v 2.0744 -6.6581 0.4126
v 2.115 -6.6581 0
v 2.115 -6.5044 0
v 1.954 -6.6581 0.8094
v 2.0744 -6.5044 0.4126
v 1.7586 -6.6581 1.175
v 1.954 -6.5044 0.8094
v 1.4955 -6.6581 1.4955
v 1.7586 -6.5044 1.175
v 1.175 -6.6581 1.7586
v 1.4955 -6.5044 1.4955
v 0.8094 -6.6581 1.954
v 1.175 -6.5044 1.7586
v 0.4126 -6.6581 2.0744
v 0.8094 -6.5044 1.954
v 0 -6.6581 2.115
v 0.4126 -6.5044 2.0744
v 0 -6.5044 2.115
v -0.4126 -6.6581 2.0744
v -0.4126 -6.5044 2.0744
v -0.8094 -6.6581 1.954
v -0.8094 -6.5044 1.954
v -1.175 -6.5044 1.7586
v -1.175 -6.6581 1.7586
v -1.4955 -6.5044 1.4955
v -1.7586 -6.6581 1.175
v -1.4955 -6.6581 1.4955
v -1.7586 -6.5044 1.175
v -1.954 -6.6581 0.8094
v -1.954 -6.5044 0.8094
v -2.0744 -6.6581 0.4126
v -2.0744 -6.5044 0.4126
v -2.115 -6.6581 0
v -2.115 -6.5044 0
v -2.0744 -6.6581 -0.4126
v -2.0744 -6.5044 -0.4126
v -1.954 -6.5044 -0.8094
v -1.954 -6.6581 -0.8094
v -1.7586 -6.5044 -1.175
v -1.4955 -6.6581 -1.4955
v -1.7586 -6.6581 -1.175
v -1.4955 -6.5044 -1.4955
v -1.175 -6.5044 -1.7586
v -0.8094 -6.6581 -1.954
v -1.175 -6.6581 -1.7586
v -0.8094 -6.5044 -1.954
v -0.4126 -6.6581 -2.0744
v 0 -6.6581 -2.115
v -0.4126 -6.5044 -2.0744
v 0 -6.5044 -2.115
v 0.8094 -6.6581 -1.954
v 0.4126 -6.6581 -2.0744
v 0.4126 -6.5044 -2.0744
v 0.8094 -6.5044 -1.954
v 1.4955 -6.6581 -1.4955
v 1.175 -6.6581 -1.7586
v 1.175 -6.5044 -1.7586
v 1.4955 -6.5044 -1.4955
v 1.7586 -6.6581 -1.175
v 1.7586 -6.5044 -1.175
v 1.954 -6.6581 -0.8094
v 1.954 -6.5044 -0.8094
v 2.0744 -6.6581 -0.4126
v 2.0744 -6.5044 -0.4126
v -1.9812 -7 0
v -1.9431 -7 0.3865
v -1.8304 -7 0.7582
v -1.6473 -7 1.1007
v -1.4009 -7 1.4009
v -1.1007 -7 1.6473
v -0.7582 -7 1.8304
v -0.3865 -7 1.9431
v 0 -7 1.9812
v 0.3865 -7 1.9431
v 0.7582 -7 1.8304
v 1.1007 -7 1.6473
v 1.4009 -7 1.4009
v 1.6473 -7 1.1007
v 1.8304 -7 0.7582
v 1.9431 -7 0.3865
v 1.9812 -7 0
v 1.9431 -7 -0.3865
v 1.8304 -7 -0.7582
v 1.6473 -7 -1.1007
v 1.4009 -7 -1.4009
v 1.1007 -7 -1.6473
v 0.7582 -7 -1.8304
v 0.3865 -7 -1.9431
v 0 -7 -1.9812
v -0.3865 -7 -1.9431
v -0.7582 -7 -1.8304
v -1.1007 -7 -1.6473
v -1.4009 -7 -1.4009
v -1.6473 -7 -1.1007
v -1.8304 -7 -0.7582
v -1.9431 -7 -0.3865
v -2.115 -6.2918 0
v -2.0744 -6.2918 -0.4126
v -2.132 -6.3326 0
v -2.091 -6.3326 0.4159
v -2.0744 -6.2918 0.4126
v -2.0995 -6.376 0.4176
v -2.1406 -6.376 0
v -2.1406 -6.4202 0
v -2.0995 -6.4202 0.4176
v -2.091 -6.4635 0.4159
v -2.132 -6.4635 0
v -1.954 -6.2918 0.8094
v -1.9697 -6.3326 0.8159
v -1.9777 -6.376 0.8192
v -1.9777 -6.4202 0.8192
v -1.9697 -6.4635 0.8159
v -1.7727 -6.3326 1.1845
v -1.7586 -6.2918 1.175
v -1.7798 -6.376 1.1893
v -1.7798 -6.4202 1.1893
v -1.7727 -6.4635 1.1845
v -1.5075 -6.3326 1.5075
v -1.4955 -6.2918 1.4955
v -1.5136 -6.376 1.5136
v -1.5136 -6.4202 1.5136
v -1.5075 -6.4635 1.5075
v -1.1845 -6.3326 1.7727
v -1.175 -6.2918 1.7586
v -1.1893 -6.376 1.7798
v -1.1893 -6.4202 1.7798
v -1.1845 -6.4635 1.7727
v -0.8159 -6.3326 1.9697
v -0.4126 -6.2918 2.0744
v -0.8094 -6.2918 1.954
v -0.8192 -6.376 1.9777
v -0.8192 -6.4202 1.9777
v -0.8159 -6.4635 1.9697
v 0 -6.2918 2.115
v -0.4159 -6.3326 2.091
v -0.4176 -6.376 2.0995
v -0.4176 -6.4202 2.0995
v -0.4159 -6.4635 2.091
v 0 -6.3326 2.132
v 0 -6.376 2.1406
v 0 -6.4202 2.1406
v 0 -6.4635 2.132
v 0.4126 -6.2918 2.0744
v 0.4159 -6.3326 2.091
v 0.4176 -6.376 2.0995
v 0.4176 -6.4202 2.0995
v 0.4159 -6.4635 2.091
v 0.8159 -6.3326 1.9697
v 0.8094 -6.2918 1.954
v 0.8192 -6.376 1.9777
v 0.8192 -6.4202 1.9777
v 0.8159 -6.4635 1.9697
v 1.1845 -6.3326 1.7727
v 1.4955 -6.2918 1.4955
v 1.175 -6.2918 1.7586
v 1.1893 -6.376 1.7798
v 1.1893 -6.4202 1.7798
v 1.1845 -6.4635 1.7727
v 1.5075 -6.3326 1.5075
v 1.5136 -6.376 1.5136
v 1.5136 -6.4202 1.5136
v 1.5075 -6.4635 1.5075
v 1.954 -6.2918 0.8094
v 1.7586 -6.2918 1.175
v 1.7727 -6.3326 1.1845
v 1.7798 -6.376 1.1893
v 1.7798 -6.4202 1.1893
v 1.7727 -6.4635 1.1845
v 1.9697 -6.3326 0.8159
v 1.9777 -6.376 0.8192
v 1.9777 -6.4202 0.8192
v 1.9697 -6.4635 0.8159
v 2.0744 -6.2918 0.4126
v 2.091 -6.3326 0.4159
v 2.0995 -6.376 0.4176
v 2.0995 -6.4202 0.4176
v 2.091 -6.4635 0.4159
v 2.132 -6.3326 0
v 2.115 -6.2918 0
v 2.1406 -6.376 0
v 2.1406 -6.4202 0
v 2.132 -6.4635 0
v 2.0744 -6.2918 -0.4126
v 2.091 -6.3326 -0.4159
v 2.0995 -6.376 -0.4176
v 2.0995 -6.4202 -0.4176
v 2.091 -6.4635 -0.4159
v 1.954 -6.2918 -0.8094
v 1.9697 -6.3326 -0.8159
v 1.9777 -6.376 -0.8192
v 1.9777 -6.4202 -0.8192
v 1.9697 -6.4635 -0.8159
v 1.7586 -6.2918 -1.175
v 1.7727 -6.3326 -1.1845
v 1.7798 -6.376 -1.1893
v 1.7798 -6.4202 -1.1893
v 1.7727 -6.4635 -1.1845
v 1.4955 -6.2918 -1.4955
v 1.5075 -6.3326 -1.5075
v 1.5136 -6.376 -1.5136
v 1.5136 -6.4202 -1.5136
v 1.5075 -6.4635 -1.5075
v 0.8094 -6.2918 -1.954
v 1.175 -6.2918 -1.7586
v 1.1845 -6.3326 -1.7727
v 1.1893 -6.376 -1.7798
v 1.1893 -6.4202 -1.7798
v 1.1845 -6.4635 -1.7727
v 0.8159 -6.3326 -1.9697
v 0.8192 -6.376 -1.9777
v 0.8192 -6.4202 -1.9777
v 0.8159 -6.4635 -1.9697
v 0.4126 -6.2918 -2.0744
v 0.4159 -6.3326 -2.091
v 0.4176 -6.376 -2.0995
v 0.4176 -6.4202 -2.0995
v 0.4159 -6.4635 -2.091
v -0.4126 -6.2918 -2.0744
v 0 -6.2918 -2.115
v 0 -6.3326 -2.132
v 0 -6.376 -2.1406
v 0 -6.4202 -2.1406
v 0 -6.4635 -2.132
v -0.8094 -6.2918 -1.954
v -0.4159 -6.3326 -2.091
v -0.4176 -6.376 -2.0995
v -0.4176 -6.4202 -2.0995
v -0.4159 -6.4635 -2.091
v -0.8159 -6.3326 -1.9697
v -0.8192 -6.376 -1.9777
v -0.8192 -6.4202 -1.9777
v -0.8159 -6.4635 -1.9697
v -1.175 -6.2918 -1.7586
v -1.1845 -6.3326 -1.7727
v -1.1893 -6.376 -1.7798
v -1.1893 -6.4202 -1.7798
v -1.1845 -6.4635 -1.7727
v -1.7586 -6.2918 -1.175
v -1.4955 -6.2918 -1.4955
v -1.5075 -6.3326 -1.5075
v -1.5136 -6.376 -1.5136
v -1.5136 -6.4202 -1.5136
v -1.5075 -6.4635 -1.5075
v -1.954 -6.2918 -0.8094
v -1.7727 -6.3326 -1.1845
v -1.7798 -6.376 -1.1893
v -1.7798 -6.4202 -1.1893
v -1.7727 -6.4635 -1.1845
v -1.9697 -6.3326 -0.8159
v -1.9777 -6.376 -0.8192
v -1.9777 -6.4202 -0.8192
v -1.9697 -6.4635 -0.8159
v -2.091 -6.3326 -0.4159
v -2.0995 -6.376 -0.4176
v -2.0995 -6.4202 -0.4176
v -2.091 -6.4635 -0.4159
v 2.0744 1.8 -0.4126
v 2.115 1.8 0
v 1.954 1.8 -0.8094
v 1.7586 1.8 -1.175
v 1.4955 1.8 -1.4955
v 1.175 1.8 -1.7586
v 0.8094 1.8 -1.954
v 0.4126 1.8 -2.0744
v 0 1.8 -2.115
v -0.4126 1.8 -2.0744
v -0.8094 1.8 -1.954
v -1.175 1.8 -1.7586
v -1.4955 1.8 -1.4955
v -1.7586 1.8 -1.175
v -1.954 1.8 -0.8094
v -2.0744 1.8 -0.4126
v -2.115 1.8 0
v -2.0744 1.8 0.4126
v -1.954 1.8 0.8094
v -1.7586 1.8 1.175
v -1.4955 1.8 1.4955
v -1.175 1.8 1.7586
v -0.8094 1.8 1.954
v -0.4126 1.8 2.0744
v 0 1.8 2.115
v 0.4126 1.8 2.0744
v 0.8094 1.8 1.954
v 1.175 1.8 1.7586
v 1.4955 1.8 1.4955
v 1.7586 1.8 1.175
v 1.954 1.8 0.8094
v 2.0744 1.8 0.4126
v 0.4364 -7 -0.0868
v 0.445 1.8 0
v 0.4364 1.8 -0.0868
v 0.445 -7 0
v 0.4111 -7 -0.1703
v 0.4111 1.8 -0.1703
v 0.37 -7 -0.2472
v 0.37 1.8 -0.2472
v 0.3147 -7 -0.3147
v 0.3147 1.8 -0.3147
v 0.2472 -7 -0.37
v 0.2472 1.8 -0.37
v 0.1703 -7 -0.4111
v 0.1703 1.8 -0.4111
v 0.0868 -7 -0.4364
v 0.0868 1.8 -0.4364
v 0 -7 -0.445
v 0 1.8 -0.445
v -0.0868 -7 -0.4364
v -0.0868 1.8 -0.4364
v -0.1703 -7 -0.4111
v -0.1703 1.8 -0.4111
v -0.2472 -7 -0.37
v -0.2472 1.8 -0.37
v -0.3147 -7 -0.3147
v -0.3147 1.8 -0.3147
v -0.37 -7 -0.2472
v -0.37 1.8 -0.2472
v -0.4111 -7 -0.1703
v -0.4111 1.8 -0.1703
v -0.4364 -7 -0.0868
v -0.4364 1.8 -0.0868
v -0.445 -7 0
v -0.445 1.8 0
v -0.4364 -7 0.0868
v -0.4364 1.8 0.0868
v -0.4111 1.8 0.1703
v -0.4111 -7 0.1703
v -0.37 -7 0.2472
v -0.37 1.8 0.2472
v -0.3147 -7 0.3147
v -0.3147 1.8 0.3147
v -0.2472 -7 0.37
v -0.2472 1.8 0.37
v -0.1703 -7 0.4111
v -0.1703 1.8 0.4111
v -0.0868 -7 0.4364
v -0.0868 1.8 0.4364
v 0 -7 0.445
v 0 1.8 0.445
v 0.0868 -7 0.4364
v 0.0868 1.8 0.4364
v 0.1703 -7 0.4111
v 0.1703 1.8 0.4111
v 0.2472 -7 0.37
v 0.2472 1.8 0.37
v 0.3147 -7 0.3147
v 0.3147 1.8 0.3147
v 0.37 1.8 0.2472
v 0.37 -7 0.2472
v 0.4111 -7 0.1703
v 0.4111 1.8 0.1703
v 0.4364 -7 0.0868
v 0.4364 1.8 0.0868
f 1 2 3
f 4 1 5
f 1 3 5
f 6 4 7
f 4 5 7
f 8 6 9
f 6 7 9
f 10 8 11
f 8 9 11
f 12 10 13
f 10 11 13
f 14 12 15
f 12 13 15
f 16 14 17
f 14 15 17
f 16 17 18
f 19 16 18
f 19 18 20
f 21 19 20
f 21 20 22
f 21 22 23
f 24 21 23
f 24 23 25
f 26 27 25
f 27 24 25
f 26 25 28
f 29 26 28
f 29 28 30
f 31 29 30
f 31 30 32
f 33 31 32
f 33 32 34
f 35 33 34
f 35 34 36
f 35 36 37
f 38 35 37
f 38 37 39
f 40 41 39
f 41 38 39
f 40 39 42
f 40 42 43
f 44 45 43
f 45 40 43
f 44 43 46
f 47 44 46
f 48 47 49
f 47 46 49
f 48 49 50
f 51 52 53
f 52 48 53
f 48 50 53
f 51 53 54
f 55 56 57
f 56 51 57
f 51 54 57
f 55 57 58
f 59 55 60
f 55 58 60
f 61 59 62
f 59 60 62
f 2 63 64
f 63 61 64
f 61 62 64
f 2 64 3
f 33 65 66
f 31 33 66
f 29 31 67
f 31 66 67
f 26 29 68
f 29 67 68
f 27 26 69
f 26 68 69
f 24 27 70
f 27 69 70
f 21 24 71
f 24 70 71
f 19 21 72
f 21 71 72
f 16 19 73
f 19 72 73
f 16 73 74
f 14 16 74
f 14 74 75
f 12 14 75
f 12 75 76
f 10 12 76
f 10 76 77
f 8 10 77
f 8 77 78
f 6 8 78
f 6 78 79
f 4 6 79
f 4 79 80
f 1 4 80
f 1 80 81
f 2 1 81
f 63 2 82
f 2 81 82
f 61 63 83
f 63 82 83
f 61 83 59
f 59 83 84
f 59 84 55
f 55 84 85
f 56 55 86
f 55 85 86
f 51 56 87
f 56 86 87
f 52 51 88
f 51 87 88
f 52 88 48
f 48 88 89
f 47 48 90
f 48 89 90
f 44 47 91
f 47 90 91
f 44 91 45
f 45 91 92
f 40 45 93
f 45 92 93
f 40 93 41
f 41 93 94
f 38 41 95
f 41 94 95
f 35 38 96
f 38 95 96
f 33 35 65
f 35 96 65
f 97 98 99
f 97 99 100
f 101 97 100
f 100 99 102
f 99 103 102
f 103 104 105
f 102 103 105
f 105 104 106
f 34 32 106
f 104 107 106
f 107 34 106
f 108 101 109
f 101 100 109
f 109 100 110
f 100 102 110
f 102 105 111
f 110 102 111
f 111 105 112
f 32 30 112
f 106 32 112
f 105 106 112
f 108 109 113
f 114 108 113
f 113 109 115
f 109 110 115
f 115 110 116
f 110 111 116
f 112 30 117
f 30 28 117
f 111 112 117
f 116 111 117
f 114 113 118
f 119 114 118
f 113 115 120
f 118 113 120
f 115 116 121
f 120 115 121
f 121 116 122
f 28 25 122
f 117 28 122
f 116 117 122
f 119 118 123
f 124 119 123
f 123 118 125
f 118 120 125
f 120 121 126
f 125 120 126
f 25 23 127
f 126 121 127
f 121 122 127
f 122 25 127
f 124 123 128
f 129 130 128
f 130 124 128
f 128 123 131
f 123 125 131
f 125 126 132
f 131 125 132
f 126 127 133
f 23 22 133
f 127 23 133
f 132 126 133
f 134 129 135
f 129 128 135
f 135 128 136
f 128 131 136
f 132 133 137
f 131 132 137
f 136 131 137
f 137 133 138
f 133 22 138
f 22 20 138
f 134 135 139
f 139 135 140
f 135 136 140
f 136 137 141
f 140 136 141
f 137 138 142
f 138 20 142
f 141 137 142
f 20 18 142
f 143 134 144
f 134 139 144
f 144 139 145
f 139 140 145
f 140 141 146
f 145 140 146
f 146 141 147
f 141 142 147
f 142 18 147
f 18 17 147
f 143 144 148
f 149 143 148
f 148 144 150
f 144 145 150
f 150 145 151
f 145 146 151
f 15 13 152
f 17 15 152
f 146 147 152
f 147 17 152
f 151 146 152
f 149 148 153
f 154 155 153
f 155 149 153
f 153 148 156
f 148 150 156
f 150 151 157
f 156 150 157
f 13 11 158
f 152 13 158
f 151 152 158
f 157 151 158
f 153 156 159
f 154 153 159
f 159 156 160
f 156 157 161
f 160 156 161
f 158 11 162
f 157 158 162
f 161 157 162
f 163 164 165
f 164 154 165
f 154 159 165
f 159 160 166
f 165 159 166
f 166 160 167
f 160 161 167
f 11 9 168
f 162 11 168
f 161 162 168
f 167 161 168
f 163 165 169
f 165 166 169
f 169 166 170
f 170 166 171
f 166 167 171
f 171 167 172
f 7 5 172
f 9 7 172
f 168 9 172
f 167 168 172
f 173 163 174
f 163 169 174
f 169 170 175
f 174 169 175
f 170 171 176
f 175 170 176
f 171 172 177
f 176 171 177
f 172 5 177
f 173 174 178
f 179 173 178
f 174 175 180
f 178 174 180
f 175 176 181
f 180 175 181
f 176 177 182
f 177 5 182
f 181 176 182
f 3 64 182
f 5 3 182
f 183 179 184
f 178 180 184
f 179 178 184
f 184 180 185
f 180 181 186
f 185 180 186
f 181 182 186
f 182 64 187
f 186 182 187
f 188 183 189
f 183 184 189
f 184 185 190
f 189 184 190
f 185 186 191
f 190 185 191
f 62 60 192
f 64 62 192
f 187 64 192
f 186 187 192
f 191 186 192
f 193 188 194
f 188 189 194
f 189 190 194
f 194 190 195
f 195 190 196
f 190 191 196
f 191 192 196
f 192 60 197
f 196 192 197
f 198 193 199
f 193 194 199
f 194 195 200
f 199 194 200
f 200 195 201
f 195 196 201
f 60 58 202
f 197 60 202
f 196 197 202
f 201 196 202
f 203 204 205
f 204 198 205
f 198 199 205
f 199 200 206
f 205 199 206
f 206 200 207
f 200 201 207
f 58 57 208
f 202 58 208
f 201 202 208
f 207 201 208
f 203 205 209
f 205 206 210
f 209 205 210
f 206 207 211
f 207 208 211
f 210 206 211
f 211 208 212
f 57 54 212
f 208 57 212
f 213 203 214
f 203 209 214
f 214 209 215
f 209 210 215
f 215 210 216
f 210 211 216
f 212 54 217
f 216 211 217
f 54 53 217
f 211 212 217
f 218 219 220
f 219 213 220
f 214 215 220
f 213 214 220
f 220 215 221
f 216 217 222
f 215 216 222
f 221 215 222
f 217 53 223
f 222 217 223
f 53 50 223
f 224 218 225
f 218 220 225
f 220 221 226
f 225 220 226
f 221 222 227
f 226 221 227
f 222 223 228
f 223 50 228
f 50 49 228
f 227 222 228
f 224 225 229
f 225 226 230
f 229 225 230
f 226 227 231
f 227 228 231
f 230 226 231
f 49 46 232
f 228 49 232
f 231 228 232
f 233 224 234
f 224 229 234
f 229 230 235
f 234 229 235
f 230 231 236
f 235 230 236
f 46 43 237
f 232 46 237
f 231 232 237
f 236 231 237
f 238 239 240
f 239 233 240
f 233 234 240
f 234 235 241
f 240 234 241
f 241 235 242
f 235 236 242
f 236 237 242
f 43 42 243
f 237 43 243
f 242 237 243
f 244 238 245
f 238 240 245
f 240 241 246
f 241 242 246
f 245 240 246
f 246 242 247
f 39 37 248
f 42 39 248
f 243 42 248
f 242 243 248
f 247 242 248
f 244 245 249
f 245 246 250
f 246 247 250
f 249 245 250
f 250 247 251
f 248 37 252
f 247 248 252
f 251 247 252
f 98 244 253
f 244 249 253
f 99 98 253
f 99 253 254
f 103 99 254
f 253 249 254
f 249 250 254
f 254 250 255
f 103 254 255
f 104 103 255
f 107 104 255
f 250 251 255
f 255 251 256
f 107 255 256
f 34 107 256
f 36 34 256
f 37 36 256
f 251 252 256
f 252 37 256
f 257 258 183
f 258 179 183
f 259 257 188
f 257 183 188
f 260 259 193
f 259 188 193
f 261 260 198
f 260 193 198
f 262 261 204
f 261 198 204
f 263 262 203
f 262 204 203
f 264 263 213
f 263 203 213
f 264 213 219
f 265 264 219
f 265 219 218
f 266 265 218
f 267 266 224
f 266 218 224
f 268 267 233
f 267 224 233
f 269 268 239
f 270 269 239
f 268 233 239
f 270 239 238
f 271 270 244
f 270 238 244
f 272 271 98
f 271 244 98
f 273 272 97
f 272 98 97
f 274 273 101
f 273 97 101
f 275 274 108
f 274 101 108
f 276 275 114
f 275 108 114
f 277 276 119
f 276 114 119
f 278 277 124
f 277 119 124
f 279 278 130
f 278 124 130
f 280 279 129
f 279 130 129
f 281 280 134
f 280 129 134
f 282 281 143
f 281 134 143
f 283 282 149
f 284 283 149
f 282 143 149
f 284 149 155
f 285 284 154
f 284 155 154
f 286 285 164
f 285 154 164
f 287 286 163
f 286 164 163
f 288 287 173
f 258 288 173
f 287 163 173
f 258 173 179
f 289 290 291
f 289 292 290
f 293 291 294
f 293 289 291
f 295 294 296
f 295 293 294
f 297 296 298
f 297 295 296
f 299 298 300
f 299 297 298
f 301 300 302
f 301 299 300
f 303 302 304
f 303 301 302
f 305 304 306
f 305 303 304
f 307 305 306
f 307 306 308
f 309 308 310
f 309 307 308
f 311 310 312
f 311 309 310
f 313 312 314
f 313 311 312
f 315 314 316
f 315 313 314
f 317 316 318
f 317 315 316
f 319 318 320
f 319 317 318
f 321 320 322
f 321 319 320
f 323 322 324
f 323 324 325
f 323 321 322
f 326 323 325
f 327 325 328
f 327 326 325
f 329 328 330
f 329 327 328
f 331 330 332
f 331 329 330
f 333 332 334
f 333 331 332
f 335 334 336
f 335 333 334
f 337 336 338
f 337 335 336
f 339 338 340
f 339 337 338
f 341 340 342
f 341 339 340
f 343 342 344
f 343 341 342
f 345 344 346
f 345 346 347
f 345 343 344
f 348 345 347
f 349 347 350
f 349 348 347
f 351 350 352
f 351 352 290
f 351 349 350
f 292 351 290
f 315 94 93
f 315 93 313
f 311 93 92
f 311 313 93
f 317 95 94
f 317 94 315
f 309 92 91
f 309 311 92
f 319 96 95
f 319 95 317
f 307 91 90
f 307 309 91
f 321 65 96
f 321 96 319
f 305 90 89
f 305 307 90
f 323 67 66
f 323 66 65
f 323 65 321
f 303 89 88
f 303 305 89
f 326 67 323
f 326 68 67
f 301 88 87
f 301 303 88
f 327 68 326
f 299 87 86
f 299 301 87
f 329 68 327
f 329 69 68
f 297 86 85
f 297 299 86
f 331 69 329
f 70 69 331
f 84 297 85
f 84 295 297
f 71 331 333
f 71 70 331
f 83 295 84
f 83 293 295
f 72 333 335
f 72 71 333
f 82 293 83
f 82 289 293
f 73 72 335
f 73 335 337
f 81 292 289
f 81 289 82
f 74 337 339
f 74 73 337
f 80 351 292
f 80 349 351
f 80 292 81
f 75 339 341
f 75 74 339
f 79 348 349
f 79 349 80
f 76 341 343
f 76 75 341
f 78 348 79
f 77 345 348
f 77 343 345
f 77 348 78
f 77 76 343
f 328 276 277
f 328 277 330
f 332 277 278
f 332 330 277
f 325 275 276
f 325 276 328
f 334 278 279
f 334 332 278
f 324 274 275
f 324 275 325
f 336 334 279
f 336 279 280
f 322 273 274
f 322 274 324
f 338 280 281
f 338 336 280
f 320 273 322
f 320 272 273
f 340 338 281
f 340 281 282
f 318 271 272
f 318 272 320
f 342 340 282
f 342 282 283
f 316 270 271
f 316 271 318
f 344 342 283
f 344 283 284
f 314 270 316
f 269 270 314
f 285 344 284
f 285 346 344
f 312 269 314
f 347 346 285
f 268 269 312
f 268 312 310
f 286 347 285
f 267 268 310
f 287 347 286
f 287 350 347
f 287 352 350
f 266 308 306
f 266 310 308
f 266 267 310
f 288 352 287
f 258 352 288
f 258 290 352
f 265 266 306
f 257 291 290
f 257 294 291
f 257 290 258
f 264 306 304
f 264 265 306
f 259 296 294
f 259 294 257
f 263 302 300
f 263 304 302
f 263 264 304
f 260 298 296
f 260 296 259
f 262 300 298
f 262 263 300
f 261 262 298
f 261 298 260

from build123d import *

# Parameters (mm, degrees)
SKETCH013_R         = 2.115
SKETCH013_R_2       = 0.445
PAD006_DEPTH        = 7
SKETCH015_R         = 0.225
GROOVE001_FACE2_R   = 2.115
GROOVE001_FACE2_R_2 = 0.445
PAD007_DEPTH        = 0.2
PAD007_FACE5_R      = 2.115
PAD007_FACE5_R_2    = 0.445
PAD008_DEPTH        = 1.6


with BuildPart() as part:
    # Sketch013 → Pad006 (new body)
    with BuildSketch(Plane.XZ):
        Circle(SKETCH013_R)
        Circle(SKETCH013_R_2, mode=Mode.SUBTRACT)
    extrude(amount=PAD006_DEPTH)

    # Sketch015 → Revolution (revolve)
    with BuildSketch(Plane.XY):
        with Locations((-1.916694, -6.398077)):
            Circle(SKETCH015_R)
    revolve(axis=Axis((0, 0, 0), (0, 1, 0)))

    # Sketch016 → Groove001 (revolve, cut)
    with BuildSketch(Plane.XY):
        Polygon((-2.238852, -6.34167), (-1.80714, -7.444808), (-2.2822, -7.159883), align=None)
    revolve(axis=Axis((0, 0, 0), (0, 1, 0)), mode=Mode.SUBTRACT)

    # Groove001 Face2 → Pad007 (add)
    with BuildSketch(Plane(origin=(0, 0, 0), x_dir=(1, 0, 0), z_dir=(0, 1, 0))):
        Circle(GROOVE001_FACE2_R)
        Circle(GROOVE001_FACE2_R_2, mode=Mode.SUBTRACT)
    extrude(amount=PAD007_DEPTH)

    # Pad007 Face5 → Pad008 (add)
    with BuildSketch(Plane(origin=(0, 0.2, 0), x_dir=(1, 0, 0), z_dir=(0, 1, 0))):
        Circle(PAD007_FACE5_R)
        Circle(PAD007_FACE5_R_2, mode=Mode.SUBTRACT)
    extrude(amount=PAD008_DEPTH)


solid = part.part
